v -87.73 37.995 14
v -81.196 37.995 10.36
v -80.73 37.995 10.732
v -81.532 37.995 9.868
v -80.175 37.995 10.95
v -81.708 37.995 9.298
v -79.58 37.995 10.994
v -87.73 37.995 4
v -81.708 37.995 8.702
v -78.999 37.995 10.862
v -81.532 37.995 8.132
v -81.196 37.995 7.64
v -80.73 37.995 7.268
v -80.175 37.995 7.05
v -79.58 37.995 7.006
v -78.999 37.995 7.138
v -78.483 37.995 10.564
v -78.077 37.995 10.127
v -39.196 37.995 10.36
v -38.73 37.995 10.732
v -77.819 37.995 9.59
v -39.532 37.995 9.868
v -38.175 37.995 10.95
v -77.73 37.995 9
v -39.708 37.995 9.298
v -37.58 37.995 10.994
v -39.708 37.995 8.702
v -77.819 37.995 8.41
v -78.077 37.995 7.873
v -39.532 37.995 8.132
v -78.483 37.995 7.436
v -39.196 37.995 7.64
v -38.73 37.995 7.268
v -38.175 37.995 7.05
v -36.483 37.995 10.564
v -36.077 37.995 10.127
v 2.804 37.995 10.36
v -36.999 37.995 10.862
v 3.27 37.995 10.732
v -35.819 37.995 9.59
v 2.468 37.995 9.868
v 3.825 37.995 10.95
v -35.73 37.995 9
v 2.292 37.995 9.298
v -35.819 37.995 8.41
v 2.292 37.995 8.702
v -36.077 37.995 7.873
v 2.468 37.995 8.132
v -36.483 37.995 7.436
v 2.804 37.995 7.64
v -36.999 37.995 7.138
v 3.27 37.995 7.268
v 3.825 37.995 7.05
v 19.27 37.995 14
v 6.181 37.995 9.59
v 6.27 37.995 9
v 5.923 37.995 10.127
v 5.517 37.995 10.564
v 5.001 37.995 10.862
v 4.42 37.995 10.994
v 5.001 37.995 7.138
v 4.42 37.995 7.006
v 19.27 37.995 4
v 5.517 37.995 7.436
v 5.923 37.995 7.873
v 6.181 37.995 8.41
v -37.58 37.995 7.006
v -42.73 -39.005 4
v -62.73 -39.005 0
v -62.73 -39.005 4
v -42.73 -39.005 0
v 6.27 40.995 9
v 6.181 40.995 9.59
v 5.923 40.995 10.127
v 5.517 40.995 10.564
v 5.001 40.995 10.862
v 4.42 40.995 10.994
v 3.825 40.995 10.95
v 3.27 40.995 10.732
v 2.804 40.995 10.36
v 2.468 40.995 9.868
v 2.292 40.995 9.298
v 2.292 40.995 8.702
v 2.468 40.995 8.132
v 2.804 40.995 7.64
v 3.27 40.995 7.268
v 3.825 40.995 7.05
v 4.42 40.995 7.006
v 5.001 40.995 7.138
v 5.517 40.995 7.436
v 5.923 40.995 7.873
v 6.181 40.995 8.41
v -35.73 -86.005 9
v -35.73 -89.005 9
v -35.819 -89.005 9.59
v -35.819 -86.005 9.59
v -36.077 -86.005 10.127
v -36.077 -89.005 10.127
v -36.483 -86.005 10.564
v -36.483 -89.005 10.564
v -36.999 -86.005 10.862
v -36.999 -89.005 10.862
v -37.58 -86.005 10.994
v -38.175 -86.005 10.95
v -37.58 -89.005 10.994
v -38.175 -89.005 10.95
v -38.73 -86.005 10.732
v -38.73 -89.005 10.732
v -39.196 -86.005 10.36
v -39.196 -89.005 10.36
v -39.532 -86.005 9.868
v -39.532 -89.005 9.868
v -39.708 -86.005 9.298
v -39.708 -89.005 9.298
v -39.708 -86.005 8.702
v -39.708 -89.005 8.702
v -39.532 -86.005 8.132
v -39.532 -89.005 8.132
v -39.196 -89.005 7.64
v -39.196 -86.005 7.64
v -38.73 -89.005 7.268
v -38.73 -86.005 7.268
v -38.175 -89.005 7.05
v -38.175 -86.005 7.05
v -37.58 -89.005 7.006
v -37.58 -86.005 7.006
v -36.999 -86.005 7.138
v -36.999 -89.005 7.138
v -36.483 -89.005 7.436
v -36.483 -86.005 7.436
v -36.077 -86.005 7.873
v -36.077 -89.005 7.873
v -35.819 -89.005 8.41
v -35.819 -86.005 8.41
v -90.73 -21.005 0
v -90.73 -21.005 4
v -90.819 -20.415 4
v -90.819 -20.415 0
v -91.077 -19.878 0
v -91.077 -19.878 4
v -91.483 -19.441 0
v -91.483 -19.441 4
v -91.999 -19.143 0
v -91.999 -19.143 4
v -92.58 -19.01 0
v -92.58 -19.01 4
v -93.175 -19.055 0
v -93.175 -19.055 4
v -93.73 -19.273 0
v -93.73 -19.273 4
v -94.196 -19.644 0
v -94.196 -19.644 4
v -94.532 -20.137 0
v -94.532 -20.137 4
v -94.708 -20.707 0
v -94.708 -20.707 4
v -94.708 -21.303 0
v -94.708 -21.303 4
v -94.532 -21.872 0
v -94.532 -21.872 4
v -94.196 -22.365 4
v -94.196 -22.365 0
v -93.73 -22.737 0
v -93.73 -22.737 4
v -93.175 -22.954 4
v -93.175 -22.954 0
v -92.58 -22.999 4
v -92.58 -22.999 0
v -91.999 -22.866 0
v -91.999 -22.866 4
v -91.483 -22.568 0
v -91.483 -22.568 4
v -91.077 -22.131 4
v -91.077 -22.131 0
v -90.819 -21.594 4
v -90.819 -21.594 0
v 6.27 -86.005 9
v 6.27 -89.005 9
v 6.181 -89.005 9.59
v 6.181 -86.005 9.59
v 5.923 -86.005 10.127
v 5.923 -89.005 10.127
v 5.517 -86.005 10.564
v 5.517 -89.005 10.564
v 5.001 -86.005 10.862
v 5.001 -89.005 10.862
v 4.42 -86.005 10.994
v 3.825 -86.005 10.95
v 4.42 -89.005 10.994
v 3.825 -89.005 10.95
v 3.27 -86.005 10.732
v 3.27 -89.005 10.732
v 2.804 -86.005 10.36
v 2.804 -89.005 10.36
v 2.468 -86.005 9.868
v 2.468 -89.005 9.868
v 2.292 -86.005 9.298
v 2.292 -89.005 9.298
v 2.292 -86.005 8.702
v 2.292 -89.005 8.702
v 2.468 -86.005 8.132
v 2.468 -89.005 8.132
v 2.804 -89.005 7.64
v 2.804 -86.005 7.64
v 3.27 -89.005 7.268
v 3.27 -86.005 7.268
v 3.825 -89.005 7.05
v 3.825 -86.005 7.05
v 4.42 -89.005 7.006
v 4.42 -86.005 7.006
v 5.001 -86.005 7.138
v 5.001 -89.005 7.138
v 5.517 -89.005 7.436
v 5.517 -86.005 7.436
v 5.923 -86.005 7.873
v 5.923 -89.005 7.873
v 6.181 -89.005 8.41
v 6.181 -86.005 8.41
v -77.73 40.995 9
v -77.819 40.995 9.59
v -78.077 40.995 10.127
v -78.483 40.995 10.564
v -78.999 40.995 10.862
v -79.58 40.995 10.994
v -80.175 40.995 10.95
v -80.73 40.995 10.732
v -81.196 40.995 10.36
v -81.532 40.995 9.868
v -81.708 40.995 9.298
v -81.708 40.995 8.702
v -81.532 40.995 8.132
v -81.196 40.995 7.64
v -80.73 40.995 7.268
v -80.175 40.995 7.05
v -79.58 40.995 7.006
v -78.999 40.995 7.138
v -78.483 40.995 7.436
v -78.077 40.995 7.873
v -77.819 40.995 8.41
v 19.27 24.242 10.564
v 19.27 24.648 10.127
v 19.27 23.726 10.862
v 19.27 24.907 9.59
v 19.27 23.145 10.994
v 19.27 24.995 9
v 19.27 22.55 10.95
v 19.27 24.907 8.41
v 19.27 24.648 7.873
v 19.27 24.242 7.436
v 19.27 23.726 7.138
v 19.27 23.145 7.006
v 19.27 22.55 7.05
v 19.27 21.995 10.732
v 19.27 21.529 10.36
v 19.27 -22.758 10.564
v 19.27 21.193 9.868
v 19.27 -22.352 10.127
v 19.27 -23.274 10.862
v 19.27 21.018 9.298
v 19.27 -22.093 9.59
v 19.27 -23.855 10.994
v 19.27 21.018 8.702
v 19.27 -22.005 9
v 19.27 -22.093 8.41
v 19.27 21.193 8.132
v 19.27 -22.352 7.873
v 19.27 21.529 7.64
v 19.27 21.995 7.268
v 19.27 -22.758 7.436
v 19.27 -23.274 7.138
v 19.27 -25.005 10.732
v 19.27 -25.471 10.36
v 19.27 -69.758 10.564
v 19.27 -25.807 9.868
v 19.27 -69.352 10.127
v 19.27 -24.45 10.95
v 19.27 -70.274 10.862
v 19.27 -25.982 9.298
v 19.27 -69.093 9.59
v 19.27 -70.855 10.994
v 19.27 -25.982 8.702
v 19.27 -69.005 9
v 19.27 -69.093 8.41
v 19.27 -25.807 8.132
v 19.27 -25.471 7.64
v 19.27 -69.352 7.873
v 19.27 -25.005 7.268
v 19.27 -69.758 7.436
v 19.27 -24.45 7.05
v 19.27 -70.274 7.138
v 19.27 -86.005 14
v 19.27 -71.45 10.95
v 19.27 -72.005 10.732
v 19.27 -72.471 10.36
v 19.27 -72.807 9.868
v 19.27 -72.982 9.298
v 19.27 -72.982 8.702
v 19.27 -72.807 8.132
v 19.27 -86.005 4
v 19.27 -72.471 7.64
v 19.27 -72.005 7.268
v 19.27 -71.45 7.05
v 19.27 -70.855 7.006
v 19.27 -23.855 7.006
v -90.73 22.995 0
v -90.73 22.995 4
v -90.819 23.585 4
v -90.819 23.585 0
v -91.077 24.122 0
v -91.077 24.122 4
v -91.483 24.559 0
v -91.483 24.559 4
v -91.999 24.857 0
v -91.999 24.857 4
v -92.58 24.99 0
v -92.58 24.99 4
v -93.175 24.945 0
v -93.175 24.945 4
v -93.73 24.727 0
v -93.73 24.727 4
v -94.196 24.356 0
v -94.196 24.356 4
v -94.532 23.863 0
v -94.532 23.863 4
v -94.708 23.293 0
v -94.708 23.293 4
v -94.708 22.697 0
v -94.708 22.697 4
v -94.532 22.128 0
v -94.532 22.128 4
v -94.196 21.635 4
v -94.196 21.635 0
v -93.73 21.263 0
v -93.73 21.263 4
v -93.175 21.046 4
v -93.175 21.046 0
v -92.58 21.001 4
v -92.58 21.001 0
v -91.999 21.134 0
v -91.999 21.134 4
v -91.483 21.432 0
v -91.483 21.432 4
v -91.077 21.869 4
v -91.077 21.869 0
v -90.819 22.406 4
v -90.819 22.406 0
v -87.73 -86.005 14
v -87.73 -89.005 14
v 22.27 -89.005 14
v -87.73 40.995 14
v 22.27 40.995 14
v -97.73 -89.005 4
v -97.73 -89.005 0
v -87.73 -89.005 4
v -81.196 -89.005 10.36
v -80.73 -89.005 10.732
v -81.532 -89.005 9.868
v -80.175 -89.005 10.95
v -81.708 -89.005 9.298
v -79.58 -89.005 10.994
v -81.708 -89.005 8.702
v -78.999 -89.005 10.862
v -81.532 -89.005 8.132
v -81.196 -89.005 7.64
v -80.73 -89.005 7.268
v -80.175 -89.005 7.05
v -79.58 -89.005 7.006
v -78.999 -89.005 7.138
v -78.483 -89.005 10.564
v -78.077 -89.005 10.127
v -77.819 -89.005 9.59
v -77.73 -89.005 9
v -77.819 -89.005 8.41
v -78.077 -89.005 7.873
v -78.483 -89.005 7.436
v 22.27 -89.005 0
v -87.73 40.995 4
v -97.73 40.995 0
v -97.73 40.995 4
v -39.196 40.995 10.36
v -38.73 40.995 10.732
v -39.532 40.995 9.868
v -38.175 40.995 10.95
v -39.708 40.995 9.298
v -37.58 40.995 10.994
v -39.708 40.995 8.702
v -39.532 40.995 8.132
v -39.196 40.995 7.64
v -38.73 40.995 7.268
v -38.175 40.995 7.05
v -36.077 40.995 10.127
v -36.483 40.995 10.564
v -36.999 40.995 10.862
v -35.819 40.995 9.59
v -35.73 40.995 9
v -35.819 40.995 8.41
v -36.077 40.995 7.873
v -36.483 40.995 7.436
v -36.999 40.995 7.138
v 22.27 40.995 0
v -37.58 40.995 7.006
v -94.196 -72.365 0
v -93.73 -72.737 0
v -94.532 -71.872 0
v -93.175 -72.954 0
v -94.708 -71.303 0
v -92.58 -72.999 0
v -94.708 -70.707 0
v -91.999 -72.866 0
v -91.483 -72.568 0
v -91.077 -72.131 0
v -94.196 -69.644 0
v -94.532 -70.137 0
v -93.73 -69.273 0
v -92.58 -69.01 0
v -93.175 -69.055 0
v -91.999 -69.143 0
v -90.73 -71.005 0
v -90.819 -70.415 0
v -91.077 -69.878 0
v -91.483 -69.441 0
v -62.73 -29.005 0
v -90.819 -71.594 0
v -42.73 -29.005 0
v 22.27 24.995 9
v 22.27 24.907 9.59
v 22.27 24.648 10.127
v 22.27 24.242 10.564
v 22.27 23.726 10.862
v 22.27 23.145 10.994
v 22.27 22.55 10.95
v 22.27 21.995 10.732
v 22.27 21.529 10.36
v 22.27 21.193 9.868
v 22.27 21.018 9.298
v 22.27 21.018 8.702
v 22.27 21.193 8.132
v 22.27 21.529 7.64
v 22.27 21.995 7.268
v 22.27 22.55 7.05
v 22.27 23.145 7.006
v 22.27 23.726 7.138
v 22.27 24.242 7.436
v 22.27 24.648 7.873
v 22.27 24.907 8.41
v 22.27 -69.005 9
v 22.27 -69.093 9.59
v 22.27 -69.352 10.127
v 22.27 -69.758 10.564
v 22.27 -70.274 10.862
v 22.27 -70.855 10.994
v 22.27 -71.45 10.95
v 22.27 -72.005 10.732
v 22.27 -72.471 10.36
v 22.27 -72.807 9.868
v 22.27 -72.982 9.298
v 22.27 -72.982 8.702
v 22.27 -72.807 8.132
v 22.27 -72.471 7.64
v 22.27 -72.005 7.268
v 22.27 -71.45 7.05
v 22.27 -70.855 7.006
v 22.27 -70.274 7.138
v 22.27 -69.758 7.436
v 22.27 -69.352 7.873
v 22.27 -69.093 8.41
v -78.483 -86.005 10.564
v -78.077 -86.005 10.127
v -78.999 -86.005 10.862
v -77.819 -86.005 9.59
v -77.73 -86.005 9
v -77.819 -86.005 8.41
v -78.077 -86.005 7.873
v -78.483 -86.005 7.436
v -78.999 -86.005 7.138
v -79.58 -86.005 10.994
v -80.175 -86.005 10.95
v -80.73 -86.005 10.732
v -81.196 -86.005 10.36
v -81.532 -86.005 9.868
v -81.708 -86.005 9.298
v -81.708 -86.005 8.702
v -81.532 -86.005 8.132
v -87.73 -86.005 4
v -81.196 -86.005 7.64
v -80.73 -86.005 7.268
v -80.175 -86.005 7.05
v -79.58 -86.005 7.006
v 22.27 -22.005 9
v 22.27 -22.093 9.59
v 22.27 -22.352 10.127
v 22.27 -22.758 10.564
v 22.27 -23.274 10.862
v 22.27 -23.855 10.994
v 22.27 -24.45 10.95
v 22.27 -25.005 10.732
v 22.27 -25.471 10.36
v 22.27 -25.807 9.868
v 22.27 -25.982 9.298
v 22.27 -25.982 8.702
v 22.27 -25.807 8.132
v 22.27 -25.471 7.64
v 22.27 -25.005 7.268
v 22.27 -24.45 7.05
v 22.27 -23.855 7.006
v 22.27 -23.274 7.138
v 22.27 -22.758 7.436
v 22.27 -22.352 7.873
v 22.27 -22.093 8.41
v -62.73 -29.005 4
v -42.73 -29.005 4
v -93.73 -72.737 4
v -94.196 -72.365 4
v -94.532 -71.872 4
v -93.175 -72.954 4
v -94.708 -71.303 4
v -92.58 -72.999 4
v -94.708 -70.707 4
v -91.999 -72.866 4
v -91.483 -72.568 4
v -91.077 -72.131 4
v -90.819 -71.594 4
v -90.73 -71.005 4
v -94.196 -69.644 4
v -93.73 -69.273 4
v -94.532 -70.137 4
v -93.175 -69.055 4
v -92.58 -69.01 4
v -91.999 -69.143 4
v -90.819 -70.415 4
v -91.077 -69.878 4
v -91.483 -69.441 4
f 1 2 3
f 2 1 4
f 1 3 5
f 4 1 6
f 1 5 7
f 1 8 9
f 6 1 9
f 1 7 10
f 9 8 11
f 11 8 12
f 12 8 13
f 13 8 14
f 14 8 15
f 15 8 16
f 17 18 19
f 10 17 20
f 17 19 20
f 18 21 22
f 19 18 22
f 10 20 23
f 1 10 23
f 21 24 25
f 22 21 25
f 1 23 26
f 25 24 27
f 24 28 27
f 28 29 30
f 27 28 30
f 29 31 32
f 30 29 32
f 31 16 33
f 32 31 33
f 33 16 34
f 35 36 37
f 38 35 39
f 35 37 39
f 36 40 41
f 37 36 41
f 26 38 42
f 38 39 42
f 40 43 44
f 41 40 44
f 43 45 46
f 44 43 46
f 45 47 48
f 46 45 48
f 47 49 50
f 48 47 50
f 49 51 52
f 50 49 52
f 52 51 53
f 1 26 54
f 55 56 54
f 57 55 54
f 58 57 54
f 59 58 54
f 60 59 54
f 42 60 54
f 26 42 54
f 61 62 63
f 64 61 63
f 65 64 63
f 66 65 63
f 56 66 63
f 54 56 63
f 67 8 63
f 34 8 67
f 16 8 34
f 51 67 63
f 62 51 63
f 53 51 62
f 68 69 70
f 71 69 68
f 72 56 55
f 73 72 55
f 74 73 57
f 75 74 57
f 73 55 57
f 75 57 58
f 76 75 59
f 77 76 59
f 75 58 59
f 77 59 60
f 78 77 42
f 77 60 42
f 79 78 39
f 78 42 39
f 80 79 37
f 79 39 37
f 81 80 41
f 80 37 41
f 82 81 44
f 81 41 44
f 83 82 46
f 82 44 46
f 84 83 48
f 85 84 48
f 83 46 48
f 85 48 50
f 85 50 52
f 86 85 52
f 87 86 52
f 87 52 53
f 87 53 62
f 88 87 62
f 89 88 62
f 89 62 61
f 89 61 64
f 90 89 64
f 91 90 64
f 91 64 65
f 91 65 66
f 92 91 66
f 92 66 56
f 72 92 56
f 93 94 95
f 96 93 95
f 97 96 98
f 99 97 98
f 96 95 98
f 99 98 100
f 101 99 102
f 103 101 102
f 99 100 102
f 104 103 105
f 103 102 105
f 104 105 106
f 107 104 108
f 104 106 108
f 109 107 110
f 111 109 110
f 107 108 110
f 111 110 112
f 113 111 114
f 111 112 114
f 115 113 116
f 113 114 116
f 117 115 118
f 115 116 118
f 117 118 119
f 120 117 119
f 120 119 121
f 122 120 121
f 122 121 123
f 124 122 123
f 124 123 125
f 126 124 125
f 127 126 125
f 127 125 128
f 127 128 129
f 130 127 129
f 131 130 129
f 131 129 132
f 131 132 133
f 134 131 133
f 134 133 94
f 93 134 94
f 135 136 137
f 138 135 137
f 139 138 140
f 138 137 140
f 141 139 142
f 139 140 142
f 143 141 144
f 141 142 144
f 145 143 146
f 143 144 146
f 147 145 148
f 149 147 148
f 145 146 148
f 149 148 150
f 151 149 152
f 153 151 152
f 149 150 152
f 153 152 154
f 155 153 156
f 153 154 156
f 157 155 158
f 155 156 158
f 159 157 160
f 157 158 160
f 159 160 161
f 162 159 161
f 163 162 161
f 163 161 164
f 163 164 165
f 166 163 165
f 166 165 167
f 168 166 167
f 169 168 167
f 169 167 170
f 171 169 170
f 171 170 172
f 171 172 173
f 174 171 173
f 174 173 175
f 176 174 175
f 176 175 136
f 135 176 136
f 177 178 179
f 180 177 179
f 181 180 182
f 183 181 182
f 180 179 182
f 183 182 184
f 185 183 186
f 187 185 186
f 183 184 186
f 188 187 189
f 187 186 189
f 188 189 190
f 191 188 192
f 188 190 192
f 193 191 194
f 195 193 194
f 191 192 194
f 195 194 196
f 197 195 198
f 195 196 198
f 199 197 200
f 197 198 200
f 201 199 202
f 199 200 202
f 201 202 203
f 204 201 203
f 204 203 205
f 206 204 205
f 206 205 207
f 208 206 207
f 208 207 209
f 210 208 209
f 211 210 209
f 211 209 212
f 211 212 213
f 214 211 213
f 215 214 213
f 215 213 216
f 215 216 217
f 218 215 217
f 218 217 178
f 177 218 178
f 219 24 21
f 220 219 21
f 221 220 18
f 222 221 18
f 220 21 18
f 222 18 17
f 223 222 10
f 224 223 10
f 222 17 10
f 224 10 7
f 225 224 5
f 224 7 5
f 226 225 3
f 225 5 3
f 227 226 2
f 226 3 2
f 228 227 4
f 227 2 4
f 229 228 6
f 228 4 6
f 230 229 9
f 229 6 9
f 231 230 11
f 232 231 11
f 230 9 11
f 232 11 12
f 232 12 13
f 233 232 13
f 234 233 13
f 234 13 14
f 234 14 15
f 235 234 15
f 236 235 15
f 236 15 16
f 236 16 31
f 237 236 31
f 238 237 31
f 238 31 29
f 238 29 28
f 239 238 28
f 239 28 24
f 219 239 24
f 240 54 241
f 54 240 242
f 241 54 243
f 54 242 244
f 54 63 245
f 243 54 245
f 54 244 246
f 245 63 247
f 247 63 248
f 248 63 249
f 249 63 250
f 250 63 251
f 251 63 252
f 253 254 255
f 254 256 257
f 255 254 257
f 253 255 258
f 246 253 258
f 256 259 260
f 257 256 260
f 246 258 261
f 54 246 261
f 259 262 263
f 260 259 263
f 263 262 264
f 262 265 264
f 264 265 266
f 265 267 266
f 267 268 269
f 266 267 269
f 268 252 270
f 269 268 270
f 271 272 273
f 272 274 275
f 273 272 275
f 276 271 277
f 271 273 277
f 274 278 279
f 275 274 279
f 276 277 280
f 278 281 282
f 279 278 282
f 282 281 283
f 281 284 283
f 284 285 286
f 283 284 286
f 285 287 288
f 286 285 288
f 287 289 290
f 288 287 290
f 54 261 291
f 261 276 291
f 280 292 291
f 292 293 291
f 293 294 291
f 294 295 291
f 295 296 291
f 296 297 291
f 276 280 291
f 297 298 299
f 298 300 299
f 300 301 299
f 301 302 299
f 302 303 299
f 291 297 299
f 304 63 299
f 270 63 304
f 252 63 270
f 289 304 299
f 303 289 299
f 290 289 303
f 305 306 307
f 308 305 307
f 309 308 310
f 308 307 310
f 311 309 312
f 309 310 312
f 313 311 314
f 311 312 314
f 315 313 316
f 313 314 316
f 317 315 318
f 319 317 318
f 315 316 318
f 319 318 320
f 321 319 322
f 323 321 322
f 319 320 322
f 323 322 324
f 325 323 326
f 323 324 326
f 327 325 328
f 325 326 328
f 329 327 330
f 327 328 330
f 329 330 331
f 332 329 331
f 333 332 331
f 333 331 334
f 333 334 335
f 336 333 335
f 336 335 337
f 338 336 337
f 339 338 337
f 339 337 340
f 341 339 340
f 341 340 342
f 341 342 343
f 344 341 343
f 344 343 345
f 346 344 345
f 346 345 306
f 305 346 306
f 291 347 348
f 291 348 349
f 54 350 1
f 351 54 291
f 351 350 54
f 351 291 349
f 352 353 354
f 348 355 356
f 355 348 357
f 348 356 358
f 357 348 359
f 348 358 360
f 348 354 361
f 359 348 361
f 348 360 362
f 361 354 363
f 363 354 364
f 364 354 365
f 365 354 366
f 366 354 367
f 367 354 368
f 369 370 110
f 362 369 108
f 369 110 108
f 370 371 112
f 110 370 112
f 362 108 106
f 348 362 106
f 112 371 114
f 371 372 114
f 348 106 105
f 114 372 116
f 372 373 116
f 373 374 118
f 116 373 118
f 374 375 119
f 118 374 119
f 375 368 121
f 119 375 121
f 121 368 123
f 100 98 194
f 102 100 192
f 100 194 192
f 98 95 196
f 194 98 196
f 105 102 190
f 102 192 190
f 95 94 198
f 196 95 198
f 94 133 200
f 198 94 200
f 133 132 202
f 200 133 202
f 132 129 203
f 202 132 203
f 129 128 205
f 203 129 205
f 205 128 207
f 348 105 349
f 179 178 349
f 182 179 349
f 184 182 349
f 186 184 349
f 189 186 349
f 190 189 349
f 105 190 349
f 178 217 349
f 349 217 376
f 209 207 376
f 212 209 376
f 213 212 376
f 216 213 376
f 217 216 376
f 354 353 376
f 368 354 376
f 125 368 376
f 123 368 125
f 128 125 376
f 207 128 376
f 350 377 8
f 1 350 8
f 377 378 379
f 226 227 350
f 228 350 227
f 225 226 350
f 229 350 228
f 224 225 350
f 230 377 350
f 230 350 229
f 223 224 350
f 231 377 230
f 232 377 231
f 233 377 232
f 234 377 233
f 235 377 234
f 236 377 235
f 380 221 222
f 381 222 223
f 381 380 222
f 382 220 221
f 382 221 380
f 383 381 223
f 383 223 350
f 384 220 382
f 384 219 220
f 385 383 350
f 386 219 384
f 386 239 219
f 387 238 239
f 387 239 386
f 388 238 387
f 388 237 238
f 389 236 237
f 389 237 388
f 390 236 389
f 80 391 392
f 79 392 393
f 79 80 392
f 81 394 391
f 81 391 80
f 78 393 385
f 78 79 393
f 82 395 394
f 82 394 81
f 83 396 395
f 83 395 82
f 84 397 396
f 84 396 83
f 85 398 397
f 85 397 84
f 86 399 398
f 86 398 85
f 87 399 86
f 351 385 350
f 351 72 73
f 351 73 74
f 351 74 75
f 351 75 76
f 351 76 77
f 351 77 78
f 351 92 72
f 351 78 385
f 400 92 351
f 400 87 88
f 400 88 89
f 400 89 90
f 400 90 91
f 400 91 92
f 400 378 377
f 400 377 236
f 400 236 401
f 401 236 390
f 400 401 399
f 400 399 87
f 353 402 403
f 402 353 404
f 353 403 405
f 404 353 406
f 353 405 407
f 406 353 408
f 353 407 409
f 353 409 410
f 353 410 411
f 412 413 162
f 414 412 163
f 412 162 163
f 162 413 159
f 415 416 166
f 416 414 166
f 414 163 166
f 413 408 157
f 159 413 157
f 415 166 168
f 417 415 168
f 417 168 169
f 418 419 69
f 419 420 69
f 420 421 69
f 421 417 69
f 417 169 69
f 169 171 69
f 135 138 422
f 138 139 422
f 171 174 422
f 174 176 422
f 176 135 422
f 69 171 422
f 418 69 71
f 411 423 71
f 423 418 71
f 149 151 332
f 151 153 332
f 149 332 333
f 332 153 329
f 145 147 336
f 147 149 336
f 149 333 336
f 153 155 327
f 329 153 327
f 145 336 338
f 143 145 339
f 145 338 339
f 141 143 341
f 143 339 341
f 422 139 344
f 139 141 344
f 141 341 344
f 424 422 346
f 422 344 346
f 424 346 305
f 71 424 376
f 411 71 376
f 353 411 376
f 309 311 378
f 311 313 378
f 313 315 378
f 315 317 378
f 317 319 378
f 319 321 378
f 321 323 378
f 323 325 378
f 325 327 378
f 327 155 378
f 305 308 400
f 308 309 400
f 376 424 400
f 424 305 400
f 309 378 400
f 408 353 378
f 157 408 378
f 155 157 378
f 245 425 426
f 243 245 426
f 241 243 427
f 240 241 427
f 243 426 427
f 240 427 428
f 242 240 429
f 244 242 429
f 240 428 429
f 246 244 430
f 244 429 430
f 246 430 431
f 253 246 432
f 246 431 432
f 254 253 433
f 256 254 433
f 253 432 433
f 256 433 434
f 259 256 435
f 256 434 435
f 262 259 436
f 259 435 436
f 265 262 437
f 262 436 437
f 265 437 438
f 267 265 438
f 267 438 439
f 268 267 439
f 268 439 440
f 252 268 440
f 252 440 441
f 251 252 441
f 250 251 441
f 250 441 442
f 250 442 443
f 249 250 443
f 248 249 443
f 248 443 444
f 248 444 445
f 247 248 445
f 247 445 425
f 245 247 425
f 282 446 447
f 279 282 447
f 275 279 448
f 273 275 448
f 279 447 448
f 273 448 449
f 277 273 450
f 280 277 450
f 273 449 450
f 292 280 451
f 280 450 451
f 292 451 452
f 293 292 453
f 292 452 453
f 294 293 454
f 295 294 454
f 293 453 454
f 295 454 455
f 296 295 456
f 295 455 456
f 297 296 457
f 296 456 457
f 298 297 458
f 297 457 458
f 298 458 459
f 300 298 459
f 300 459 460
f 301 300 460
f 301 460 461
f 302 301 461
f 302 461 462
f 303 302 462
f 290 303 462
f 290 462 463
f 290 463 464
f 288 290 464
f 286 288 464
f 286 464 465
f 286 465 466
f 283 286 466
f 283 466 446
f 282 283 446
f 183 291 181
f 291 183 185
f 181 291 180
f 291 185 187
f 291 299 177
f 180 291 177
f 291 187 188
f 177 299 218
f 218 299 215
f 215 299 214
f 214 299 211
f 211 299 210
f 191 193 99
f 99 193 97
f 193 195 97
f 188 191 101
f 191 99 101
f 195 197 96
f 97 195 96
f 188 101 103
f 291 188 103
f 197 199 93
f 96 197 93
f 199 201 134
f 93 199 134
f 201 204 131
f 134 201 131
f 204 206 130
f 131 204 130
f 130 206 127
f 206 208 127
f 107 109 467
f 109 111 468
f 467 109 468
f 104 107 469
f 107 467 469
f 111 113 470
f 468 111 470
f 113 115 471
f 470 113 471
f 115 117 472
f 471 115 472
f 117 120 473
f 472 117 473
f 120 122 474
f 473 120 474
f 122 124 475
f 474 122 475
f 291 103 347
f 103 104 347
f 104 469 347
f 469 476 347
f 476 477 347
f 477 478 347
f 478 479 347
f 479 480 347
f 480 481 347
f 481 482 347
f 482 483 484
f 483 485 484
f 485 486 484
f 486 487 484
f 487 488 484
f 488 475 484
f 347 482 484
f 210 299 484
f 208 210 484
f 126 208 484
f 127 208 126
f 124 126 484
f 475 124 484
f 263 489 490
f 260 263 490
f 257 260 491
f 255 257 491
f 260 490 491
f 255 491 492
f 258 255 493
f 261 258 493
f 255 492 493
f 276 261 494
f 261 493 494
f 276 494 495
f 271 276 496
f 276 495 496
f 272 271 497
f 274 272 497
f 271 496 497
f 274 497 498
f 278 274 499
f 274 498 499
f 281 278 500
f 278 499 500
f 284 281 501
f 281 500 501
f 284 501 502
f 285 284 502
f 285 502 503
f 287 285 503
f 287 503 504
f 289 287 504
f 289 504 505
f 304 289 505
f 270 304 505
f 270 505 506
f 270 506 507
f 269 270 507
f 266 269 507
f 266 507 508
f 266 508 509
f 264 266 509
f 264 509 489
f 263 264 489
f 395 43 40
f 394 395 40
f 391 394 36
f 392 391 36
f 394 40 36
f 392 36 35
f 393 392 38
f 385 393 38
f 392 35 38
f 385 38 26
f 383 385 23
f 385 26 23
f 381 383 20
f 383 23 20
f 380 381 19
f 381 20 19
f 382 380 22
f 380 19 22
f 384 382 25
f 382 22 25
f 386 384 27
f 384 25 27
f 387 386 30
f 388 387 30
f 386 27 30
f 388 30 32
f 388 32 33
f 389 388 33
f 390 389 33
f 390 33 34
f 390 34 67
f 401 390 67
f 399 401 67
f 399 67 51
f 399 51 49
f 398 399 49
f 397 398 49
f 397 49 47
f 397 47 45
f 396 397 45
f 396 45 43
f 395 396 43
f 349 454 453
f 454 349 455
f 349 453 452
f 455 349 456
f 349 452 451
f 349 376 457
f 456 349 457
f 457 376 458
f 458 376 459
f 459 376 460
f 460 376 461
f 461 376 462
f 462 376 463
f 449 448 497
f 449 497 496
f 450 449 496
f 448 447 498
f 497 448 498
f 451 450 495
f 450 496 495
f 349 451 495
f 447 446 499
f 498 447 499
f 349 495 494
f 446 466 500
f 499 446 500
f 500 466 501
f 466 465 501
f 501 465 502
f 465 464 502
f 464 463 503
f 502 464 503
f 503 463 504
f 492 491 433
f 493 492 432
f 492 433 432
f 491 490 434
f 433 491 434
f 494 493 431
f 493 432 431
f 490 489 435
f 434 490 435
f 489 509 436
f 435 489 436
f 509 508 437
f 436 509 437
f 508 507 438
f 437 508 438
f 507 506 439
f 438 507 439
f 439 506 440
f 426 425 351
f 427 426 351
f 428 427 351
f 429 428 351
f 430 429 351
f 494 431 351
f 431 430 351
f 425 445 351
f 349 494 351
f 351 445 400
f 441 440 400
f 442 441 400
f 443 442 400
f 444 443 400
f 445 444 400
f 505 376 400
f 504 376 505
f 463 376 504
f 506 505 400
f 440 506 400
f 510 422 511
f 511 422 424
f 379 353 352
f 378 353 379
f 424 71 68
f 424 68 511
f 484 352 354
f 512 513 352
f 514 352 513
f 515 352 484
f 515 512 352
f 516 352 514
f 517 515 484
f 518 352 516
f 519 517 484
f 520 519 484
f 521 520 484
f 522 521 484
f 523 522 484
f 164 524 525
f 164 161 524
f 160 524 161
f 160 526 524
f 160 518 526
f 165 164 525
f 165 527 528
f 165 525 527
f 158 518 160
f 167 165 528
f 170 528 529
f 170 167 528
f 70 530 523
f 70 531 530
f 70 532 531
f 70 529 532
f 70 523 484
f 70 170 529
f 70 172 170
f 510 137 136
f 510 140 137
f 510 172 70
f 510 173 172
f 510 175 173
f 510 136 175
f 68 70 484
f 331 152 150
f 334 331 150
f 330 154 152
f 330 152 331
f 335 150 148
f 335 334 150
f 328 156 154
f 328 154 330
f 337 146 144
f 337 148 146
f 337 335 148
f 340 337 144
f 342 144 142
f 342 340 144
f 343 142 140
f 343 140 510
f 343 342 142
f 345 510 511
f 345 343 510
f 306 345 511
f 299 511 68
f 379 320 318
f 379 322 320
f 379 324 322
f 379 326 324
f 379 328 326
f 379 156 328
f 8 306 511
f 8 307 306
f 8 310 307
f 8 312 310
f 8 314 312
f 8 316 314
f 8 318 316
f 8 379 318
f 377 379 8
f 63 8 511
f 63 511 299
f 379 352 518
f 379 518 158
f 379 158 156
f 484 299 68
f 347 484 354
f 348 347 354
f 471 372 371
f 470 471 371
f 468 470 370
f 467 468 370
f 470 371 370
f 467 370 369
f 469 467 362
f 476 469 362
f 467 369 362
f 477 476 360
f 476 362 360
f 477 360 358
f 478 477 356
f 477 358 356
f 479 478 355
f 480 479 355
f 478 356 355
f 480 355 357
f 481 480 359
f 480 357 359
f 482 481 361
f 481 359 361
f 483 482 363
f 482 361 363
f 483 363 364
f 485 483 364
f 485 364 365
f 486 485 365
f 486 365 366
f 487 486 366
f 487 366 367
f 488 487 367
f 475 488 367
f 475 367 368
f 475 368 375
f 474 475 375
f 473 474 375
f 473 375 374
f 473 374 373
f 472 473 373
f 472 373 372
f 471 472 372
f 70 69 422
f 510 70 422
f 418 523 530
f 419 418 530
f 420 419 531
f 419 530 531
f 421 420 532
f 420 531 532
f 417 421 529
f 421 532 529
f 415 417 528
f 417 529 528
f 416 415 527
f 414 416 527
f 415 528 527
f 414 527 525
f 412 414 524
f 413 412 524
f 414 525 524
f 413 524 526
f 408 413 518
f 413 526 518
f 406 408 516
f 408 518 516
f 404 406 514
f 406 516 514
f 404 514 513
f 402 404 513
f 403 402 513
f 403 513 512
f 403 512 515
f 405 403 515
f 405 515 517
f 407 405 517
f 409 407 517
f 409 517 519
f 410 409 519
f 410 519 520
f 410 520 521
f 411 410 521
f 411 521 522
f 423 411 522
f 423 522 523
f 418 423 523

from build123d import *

# Parameters (mm, degrees)
F0_W      = 120
F0_H      = 130
F1_DEPTH  = 4
F3_DEPTH  = 10
F4_R      = 2
F5_DEPTH  = 5
F6_R      = 2
F7_DEPTH  = 135
F8_R      = 2
F9_DEPTH  = 5
F10_W     = 20
F10_H     = 10
F11_DEPTH = 5


with BuildPart() as f1:
    # F0 (on Top) → F1 (new body)
    with BuildSketch(Plane.XY):
        with Locations((-37.729894, -24.004591)):
            Rectangle(F0_W, F0_H)
    extrude(amount=F1_DEPTH)

    # F2 (on face) → F3 (join)
    with BuildSketch(Plane.XY.offset(4)):
        Polygon((-87.729894, -86.004591), (-87.729894, -89.004591), (22.270106, -89.004591), (22.270106, 40.995409), (-87.729894, 40.995409), (-87.729894, 37.995409), (19.270106, 37.995409), (19.270106, -86.004591), align=None)
    extrude(amount=F3_DEPTH)

    # F4 (on face) → F5 (cut)
    with BuildSketch(Plane.XY.offset(4)):
        with Locations((-92.729894, -21.004591)):
            Circle(F4_R)
        with Locations((-92.729894, -71.004591)):
            Circle(F4_R)
        with Locations((-92.729894, 22.995409)):
            Circle(F4_R)
    extrude(amount=-F5_DEPTH, mode=Mode.SUBTRACT)

    # F6 (on face) → F7 (cut)
    with BuildSketch(Plane.XZ.offset(89.004591)):
        with Locations((4.270106, 9)):
            Circle(F6_R)
        with Locations((-37.729894, 9)):
            Circle(F6_R)
        with Locations((-79.729894, 9)):
            Circle(F6_R)
    extrude(amount=-F7_DEPTH, mode=Mode.SUBTRACT)

    # F8 (on face) → F9 (cut)
    with BuildSketch(Plane.YZ.offset(22.270106)):
        with Locations((-71.004591, 9)):
            Circle(F8_R)
        with Locations((-24.004591, 9)):
            Circle(F8_R)
        with Locations((22.995409, 9)):
            Circle(F8_R)
    extrude(amount=-F9_DEPTH, mode=Mode.SUBTRACT)

    # F10 (on face) → F11 (cut)
    with BuildSketch(Plane.XY):
        with Locations((-52.729894, -34.004591)):
            Rectangle(F10_W, F10_H)
    extrude(amount=F11_DEPTH, mode=Mode.SUBTRACT)


solid = f1.part
